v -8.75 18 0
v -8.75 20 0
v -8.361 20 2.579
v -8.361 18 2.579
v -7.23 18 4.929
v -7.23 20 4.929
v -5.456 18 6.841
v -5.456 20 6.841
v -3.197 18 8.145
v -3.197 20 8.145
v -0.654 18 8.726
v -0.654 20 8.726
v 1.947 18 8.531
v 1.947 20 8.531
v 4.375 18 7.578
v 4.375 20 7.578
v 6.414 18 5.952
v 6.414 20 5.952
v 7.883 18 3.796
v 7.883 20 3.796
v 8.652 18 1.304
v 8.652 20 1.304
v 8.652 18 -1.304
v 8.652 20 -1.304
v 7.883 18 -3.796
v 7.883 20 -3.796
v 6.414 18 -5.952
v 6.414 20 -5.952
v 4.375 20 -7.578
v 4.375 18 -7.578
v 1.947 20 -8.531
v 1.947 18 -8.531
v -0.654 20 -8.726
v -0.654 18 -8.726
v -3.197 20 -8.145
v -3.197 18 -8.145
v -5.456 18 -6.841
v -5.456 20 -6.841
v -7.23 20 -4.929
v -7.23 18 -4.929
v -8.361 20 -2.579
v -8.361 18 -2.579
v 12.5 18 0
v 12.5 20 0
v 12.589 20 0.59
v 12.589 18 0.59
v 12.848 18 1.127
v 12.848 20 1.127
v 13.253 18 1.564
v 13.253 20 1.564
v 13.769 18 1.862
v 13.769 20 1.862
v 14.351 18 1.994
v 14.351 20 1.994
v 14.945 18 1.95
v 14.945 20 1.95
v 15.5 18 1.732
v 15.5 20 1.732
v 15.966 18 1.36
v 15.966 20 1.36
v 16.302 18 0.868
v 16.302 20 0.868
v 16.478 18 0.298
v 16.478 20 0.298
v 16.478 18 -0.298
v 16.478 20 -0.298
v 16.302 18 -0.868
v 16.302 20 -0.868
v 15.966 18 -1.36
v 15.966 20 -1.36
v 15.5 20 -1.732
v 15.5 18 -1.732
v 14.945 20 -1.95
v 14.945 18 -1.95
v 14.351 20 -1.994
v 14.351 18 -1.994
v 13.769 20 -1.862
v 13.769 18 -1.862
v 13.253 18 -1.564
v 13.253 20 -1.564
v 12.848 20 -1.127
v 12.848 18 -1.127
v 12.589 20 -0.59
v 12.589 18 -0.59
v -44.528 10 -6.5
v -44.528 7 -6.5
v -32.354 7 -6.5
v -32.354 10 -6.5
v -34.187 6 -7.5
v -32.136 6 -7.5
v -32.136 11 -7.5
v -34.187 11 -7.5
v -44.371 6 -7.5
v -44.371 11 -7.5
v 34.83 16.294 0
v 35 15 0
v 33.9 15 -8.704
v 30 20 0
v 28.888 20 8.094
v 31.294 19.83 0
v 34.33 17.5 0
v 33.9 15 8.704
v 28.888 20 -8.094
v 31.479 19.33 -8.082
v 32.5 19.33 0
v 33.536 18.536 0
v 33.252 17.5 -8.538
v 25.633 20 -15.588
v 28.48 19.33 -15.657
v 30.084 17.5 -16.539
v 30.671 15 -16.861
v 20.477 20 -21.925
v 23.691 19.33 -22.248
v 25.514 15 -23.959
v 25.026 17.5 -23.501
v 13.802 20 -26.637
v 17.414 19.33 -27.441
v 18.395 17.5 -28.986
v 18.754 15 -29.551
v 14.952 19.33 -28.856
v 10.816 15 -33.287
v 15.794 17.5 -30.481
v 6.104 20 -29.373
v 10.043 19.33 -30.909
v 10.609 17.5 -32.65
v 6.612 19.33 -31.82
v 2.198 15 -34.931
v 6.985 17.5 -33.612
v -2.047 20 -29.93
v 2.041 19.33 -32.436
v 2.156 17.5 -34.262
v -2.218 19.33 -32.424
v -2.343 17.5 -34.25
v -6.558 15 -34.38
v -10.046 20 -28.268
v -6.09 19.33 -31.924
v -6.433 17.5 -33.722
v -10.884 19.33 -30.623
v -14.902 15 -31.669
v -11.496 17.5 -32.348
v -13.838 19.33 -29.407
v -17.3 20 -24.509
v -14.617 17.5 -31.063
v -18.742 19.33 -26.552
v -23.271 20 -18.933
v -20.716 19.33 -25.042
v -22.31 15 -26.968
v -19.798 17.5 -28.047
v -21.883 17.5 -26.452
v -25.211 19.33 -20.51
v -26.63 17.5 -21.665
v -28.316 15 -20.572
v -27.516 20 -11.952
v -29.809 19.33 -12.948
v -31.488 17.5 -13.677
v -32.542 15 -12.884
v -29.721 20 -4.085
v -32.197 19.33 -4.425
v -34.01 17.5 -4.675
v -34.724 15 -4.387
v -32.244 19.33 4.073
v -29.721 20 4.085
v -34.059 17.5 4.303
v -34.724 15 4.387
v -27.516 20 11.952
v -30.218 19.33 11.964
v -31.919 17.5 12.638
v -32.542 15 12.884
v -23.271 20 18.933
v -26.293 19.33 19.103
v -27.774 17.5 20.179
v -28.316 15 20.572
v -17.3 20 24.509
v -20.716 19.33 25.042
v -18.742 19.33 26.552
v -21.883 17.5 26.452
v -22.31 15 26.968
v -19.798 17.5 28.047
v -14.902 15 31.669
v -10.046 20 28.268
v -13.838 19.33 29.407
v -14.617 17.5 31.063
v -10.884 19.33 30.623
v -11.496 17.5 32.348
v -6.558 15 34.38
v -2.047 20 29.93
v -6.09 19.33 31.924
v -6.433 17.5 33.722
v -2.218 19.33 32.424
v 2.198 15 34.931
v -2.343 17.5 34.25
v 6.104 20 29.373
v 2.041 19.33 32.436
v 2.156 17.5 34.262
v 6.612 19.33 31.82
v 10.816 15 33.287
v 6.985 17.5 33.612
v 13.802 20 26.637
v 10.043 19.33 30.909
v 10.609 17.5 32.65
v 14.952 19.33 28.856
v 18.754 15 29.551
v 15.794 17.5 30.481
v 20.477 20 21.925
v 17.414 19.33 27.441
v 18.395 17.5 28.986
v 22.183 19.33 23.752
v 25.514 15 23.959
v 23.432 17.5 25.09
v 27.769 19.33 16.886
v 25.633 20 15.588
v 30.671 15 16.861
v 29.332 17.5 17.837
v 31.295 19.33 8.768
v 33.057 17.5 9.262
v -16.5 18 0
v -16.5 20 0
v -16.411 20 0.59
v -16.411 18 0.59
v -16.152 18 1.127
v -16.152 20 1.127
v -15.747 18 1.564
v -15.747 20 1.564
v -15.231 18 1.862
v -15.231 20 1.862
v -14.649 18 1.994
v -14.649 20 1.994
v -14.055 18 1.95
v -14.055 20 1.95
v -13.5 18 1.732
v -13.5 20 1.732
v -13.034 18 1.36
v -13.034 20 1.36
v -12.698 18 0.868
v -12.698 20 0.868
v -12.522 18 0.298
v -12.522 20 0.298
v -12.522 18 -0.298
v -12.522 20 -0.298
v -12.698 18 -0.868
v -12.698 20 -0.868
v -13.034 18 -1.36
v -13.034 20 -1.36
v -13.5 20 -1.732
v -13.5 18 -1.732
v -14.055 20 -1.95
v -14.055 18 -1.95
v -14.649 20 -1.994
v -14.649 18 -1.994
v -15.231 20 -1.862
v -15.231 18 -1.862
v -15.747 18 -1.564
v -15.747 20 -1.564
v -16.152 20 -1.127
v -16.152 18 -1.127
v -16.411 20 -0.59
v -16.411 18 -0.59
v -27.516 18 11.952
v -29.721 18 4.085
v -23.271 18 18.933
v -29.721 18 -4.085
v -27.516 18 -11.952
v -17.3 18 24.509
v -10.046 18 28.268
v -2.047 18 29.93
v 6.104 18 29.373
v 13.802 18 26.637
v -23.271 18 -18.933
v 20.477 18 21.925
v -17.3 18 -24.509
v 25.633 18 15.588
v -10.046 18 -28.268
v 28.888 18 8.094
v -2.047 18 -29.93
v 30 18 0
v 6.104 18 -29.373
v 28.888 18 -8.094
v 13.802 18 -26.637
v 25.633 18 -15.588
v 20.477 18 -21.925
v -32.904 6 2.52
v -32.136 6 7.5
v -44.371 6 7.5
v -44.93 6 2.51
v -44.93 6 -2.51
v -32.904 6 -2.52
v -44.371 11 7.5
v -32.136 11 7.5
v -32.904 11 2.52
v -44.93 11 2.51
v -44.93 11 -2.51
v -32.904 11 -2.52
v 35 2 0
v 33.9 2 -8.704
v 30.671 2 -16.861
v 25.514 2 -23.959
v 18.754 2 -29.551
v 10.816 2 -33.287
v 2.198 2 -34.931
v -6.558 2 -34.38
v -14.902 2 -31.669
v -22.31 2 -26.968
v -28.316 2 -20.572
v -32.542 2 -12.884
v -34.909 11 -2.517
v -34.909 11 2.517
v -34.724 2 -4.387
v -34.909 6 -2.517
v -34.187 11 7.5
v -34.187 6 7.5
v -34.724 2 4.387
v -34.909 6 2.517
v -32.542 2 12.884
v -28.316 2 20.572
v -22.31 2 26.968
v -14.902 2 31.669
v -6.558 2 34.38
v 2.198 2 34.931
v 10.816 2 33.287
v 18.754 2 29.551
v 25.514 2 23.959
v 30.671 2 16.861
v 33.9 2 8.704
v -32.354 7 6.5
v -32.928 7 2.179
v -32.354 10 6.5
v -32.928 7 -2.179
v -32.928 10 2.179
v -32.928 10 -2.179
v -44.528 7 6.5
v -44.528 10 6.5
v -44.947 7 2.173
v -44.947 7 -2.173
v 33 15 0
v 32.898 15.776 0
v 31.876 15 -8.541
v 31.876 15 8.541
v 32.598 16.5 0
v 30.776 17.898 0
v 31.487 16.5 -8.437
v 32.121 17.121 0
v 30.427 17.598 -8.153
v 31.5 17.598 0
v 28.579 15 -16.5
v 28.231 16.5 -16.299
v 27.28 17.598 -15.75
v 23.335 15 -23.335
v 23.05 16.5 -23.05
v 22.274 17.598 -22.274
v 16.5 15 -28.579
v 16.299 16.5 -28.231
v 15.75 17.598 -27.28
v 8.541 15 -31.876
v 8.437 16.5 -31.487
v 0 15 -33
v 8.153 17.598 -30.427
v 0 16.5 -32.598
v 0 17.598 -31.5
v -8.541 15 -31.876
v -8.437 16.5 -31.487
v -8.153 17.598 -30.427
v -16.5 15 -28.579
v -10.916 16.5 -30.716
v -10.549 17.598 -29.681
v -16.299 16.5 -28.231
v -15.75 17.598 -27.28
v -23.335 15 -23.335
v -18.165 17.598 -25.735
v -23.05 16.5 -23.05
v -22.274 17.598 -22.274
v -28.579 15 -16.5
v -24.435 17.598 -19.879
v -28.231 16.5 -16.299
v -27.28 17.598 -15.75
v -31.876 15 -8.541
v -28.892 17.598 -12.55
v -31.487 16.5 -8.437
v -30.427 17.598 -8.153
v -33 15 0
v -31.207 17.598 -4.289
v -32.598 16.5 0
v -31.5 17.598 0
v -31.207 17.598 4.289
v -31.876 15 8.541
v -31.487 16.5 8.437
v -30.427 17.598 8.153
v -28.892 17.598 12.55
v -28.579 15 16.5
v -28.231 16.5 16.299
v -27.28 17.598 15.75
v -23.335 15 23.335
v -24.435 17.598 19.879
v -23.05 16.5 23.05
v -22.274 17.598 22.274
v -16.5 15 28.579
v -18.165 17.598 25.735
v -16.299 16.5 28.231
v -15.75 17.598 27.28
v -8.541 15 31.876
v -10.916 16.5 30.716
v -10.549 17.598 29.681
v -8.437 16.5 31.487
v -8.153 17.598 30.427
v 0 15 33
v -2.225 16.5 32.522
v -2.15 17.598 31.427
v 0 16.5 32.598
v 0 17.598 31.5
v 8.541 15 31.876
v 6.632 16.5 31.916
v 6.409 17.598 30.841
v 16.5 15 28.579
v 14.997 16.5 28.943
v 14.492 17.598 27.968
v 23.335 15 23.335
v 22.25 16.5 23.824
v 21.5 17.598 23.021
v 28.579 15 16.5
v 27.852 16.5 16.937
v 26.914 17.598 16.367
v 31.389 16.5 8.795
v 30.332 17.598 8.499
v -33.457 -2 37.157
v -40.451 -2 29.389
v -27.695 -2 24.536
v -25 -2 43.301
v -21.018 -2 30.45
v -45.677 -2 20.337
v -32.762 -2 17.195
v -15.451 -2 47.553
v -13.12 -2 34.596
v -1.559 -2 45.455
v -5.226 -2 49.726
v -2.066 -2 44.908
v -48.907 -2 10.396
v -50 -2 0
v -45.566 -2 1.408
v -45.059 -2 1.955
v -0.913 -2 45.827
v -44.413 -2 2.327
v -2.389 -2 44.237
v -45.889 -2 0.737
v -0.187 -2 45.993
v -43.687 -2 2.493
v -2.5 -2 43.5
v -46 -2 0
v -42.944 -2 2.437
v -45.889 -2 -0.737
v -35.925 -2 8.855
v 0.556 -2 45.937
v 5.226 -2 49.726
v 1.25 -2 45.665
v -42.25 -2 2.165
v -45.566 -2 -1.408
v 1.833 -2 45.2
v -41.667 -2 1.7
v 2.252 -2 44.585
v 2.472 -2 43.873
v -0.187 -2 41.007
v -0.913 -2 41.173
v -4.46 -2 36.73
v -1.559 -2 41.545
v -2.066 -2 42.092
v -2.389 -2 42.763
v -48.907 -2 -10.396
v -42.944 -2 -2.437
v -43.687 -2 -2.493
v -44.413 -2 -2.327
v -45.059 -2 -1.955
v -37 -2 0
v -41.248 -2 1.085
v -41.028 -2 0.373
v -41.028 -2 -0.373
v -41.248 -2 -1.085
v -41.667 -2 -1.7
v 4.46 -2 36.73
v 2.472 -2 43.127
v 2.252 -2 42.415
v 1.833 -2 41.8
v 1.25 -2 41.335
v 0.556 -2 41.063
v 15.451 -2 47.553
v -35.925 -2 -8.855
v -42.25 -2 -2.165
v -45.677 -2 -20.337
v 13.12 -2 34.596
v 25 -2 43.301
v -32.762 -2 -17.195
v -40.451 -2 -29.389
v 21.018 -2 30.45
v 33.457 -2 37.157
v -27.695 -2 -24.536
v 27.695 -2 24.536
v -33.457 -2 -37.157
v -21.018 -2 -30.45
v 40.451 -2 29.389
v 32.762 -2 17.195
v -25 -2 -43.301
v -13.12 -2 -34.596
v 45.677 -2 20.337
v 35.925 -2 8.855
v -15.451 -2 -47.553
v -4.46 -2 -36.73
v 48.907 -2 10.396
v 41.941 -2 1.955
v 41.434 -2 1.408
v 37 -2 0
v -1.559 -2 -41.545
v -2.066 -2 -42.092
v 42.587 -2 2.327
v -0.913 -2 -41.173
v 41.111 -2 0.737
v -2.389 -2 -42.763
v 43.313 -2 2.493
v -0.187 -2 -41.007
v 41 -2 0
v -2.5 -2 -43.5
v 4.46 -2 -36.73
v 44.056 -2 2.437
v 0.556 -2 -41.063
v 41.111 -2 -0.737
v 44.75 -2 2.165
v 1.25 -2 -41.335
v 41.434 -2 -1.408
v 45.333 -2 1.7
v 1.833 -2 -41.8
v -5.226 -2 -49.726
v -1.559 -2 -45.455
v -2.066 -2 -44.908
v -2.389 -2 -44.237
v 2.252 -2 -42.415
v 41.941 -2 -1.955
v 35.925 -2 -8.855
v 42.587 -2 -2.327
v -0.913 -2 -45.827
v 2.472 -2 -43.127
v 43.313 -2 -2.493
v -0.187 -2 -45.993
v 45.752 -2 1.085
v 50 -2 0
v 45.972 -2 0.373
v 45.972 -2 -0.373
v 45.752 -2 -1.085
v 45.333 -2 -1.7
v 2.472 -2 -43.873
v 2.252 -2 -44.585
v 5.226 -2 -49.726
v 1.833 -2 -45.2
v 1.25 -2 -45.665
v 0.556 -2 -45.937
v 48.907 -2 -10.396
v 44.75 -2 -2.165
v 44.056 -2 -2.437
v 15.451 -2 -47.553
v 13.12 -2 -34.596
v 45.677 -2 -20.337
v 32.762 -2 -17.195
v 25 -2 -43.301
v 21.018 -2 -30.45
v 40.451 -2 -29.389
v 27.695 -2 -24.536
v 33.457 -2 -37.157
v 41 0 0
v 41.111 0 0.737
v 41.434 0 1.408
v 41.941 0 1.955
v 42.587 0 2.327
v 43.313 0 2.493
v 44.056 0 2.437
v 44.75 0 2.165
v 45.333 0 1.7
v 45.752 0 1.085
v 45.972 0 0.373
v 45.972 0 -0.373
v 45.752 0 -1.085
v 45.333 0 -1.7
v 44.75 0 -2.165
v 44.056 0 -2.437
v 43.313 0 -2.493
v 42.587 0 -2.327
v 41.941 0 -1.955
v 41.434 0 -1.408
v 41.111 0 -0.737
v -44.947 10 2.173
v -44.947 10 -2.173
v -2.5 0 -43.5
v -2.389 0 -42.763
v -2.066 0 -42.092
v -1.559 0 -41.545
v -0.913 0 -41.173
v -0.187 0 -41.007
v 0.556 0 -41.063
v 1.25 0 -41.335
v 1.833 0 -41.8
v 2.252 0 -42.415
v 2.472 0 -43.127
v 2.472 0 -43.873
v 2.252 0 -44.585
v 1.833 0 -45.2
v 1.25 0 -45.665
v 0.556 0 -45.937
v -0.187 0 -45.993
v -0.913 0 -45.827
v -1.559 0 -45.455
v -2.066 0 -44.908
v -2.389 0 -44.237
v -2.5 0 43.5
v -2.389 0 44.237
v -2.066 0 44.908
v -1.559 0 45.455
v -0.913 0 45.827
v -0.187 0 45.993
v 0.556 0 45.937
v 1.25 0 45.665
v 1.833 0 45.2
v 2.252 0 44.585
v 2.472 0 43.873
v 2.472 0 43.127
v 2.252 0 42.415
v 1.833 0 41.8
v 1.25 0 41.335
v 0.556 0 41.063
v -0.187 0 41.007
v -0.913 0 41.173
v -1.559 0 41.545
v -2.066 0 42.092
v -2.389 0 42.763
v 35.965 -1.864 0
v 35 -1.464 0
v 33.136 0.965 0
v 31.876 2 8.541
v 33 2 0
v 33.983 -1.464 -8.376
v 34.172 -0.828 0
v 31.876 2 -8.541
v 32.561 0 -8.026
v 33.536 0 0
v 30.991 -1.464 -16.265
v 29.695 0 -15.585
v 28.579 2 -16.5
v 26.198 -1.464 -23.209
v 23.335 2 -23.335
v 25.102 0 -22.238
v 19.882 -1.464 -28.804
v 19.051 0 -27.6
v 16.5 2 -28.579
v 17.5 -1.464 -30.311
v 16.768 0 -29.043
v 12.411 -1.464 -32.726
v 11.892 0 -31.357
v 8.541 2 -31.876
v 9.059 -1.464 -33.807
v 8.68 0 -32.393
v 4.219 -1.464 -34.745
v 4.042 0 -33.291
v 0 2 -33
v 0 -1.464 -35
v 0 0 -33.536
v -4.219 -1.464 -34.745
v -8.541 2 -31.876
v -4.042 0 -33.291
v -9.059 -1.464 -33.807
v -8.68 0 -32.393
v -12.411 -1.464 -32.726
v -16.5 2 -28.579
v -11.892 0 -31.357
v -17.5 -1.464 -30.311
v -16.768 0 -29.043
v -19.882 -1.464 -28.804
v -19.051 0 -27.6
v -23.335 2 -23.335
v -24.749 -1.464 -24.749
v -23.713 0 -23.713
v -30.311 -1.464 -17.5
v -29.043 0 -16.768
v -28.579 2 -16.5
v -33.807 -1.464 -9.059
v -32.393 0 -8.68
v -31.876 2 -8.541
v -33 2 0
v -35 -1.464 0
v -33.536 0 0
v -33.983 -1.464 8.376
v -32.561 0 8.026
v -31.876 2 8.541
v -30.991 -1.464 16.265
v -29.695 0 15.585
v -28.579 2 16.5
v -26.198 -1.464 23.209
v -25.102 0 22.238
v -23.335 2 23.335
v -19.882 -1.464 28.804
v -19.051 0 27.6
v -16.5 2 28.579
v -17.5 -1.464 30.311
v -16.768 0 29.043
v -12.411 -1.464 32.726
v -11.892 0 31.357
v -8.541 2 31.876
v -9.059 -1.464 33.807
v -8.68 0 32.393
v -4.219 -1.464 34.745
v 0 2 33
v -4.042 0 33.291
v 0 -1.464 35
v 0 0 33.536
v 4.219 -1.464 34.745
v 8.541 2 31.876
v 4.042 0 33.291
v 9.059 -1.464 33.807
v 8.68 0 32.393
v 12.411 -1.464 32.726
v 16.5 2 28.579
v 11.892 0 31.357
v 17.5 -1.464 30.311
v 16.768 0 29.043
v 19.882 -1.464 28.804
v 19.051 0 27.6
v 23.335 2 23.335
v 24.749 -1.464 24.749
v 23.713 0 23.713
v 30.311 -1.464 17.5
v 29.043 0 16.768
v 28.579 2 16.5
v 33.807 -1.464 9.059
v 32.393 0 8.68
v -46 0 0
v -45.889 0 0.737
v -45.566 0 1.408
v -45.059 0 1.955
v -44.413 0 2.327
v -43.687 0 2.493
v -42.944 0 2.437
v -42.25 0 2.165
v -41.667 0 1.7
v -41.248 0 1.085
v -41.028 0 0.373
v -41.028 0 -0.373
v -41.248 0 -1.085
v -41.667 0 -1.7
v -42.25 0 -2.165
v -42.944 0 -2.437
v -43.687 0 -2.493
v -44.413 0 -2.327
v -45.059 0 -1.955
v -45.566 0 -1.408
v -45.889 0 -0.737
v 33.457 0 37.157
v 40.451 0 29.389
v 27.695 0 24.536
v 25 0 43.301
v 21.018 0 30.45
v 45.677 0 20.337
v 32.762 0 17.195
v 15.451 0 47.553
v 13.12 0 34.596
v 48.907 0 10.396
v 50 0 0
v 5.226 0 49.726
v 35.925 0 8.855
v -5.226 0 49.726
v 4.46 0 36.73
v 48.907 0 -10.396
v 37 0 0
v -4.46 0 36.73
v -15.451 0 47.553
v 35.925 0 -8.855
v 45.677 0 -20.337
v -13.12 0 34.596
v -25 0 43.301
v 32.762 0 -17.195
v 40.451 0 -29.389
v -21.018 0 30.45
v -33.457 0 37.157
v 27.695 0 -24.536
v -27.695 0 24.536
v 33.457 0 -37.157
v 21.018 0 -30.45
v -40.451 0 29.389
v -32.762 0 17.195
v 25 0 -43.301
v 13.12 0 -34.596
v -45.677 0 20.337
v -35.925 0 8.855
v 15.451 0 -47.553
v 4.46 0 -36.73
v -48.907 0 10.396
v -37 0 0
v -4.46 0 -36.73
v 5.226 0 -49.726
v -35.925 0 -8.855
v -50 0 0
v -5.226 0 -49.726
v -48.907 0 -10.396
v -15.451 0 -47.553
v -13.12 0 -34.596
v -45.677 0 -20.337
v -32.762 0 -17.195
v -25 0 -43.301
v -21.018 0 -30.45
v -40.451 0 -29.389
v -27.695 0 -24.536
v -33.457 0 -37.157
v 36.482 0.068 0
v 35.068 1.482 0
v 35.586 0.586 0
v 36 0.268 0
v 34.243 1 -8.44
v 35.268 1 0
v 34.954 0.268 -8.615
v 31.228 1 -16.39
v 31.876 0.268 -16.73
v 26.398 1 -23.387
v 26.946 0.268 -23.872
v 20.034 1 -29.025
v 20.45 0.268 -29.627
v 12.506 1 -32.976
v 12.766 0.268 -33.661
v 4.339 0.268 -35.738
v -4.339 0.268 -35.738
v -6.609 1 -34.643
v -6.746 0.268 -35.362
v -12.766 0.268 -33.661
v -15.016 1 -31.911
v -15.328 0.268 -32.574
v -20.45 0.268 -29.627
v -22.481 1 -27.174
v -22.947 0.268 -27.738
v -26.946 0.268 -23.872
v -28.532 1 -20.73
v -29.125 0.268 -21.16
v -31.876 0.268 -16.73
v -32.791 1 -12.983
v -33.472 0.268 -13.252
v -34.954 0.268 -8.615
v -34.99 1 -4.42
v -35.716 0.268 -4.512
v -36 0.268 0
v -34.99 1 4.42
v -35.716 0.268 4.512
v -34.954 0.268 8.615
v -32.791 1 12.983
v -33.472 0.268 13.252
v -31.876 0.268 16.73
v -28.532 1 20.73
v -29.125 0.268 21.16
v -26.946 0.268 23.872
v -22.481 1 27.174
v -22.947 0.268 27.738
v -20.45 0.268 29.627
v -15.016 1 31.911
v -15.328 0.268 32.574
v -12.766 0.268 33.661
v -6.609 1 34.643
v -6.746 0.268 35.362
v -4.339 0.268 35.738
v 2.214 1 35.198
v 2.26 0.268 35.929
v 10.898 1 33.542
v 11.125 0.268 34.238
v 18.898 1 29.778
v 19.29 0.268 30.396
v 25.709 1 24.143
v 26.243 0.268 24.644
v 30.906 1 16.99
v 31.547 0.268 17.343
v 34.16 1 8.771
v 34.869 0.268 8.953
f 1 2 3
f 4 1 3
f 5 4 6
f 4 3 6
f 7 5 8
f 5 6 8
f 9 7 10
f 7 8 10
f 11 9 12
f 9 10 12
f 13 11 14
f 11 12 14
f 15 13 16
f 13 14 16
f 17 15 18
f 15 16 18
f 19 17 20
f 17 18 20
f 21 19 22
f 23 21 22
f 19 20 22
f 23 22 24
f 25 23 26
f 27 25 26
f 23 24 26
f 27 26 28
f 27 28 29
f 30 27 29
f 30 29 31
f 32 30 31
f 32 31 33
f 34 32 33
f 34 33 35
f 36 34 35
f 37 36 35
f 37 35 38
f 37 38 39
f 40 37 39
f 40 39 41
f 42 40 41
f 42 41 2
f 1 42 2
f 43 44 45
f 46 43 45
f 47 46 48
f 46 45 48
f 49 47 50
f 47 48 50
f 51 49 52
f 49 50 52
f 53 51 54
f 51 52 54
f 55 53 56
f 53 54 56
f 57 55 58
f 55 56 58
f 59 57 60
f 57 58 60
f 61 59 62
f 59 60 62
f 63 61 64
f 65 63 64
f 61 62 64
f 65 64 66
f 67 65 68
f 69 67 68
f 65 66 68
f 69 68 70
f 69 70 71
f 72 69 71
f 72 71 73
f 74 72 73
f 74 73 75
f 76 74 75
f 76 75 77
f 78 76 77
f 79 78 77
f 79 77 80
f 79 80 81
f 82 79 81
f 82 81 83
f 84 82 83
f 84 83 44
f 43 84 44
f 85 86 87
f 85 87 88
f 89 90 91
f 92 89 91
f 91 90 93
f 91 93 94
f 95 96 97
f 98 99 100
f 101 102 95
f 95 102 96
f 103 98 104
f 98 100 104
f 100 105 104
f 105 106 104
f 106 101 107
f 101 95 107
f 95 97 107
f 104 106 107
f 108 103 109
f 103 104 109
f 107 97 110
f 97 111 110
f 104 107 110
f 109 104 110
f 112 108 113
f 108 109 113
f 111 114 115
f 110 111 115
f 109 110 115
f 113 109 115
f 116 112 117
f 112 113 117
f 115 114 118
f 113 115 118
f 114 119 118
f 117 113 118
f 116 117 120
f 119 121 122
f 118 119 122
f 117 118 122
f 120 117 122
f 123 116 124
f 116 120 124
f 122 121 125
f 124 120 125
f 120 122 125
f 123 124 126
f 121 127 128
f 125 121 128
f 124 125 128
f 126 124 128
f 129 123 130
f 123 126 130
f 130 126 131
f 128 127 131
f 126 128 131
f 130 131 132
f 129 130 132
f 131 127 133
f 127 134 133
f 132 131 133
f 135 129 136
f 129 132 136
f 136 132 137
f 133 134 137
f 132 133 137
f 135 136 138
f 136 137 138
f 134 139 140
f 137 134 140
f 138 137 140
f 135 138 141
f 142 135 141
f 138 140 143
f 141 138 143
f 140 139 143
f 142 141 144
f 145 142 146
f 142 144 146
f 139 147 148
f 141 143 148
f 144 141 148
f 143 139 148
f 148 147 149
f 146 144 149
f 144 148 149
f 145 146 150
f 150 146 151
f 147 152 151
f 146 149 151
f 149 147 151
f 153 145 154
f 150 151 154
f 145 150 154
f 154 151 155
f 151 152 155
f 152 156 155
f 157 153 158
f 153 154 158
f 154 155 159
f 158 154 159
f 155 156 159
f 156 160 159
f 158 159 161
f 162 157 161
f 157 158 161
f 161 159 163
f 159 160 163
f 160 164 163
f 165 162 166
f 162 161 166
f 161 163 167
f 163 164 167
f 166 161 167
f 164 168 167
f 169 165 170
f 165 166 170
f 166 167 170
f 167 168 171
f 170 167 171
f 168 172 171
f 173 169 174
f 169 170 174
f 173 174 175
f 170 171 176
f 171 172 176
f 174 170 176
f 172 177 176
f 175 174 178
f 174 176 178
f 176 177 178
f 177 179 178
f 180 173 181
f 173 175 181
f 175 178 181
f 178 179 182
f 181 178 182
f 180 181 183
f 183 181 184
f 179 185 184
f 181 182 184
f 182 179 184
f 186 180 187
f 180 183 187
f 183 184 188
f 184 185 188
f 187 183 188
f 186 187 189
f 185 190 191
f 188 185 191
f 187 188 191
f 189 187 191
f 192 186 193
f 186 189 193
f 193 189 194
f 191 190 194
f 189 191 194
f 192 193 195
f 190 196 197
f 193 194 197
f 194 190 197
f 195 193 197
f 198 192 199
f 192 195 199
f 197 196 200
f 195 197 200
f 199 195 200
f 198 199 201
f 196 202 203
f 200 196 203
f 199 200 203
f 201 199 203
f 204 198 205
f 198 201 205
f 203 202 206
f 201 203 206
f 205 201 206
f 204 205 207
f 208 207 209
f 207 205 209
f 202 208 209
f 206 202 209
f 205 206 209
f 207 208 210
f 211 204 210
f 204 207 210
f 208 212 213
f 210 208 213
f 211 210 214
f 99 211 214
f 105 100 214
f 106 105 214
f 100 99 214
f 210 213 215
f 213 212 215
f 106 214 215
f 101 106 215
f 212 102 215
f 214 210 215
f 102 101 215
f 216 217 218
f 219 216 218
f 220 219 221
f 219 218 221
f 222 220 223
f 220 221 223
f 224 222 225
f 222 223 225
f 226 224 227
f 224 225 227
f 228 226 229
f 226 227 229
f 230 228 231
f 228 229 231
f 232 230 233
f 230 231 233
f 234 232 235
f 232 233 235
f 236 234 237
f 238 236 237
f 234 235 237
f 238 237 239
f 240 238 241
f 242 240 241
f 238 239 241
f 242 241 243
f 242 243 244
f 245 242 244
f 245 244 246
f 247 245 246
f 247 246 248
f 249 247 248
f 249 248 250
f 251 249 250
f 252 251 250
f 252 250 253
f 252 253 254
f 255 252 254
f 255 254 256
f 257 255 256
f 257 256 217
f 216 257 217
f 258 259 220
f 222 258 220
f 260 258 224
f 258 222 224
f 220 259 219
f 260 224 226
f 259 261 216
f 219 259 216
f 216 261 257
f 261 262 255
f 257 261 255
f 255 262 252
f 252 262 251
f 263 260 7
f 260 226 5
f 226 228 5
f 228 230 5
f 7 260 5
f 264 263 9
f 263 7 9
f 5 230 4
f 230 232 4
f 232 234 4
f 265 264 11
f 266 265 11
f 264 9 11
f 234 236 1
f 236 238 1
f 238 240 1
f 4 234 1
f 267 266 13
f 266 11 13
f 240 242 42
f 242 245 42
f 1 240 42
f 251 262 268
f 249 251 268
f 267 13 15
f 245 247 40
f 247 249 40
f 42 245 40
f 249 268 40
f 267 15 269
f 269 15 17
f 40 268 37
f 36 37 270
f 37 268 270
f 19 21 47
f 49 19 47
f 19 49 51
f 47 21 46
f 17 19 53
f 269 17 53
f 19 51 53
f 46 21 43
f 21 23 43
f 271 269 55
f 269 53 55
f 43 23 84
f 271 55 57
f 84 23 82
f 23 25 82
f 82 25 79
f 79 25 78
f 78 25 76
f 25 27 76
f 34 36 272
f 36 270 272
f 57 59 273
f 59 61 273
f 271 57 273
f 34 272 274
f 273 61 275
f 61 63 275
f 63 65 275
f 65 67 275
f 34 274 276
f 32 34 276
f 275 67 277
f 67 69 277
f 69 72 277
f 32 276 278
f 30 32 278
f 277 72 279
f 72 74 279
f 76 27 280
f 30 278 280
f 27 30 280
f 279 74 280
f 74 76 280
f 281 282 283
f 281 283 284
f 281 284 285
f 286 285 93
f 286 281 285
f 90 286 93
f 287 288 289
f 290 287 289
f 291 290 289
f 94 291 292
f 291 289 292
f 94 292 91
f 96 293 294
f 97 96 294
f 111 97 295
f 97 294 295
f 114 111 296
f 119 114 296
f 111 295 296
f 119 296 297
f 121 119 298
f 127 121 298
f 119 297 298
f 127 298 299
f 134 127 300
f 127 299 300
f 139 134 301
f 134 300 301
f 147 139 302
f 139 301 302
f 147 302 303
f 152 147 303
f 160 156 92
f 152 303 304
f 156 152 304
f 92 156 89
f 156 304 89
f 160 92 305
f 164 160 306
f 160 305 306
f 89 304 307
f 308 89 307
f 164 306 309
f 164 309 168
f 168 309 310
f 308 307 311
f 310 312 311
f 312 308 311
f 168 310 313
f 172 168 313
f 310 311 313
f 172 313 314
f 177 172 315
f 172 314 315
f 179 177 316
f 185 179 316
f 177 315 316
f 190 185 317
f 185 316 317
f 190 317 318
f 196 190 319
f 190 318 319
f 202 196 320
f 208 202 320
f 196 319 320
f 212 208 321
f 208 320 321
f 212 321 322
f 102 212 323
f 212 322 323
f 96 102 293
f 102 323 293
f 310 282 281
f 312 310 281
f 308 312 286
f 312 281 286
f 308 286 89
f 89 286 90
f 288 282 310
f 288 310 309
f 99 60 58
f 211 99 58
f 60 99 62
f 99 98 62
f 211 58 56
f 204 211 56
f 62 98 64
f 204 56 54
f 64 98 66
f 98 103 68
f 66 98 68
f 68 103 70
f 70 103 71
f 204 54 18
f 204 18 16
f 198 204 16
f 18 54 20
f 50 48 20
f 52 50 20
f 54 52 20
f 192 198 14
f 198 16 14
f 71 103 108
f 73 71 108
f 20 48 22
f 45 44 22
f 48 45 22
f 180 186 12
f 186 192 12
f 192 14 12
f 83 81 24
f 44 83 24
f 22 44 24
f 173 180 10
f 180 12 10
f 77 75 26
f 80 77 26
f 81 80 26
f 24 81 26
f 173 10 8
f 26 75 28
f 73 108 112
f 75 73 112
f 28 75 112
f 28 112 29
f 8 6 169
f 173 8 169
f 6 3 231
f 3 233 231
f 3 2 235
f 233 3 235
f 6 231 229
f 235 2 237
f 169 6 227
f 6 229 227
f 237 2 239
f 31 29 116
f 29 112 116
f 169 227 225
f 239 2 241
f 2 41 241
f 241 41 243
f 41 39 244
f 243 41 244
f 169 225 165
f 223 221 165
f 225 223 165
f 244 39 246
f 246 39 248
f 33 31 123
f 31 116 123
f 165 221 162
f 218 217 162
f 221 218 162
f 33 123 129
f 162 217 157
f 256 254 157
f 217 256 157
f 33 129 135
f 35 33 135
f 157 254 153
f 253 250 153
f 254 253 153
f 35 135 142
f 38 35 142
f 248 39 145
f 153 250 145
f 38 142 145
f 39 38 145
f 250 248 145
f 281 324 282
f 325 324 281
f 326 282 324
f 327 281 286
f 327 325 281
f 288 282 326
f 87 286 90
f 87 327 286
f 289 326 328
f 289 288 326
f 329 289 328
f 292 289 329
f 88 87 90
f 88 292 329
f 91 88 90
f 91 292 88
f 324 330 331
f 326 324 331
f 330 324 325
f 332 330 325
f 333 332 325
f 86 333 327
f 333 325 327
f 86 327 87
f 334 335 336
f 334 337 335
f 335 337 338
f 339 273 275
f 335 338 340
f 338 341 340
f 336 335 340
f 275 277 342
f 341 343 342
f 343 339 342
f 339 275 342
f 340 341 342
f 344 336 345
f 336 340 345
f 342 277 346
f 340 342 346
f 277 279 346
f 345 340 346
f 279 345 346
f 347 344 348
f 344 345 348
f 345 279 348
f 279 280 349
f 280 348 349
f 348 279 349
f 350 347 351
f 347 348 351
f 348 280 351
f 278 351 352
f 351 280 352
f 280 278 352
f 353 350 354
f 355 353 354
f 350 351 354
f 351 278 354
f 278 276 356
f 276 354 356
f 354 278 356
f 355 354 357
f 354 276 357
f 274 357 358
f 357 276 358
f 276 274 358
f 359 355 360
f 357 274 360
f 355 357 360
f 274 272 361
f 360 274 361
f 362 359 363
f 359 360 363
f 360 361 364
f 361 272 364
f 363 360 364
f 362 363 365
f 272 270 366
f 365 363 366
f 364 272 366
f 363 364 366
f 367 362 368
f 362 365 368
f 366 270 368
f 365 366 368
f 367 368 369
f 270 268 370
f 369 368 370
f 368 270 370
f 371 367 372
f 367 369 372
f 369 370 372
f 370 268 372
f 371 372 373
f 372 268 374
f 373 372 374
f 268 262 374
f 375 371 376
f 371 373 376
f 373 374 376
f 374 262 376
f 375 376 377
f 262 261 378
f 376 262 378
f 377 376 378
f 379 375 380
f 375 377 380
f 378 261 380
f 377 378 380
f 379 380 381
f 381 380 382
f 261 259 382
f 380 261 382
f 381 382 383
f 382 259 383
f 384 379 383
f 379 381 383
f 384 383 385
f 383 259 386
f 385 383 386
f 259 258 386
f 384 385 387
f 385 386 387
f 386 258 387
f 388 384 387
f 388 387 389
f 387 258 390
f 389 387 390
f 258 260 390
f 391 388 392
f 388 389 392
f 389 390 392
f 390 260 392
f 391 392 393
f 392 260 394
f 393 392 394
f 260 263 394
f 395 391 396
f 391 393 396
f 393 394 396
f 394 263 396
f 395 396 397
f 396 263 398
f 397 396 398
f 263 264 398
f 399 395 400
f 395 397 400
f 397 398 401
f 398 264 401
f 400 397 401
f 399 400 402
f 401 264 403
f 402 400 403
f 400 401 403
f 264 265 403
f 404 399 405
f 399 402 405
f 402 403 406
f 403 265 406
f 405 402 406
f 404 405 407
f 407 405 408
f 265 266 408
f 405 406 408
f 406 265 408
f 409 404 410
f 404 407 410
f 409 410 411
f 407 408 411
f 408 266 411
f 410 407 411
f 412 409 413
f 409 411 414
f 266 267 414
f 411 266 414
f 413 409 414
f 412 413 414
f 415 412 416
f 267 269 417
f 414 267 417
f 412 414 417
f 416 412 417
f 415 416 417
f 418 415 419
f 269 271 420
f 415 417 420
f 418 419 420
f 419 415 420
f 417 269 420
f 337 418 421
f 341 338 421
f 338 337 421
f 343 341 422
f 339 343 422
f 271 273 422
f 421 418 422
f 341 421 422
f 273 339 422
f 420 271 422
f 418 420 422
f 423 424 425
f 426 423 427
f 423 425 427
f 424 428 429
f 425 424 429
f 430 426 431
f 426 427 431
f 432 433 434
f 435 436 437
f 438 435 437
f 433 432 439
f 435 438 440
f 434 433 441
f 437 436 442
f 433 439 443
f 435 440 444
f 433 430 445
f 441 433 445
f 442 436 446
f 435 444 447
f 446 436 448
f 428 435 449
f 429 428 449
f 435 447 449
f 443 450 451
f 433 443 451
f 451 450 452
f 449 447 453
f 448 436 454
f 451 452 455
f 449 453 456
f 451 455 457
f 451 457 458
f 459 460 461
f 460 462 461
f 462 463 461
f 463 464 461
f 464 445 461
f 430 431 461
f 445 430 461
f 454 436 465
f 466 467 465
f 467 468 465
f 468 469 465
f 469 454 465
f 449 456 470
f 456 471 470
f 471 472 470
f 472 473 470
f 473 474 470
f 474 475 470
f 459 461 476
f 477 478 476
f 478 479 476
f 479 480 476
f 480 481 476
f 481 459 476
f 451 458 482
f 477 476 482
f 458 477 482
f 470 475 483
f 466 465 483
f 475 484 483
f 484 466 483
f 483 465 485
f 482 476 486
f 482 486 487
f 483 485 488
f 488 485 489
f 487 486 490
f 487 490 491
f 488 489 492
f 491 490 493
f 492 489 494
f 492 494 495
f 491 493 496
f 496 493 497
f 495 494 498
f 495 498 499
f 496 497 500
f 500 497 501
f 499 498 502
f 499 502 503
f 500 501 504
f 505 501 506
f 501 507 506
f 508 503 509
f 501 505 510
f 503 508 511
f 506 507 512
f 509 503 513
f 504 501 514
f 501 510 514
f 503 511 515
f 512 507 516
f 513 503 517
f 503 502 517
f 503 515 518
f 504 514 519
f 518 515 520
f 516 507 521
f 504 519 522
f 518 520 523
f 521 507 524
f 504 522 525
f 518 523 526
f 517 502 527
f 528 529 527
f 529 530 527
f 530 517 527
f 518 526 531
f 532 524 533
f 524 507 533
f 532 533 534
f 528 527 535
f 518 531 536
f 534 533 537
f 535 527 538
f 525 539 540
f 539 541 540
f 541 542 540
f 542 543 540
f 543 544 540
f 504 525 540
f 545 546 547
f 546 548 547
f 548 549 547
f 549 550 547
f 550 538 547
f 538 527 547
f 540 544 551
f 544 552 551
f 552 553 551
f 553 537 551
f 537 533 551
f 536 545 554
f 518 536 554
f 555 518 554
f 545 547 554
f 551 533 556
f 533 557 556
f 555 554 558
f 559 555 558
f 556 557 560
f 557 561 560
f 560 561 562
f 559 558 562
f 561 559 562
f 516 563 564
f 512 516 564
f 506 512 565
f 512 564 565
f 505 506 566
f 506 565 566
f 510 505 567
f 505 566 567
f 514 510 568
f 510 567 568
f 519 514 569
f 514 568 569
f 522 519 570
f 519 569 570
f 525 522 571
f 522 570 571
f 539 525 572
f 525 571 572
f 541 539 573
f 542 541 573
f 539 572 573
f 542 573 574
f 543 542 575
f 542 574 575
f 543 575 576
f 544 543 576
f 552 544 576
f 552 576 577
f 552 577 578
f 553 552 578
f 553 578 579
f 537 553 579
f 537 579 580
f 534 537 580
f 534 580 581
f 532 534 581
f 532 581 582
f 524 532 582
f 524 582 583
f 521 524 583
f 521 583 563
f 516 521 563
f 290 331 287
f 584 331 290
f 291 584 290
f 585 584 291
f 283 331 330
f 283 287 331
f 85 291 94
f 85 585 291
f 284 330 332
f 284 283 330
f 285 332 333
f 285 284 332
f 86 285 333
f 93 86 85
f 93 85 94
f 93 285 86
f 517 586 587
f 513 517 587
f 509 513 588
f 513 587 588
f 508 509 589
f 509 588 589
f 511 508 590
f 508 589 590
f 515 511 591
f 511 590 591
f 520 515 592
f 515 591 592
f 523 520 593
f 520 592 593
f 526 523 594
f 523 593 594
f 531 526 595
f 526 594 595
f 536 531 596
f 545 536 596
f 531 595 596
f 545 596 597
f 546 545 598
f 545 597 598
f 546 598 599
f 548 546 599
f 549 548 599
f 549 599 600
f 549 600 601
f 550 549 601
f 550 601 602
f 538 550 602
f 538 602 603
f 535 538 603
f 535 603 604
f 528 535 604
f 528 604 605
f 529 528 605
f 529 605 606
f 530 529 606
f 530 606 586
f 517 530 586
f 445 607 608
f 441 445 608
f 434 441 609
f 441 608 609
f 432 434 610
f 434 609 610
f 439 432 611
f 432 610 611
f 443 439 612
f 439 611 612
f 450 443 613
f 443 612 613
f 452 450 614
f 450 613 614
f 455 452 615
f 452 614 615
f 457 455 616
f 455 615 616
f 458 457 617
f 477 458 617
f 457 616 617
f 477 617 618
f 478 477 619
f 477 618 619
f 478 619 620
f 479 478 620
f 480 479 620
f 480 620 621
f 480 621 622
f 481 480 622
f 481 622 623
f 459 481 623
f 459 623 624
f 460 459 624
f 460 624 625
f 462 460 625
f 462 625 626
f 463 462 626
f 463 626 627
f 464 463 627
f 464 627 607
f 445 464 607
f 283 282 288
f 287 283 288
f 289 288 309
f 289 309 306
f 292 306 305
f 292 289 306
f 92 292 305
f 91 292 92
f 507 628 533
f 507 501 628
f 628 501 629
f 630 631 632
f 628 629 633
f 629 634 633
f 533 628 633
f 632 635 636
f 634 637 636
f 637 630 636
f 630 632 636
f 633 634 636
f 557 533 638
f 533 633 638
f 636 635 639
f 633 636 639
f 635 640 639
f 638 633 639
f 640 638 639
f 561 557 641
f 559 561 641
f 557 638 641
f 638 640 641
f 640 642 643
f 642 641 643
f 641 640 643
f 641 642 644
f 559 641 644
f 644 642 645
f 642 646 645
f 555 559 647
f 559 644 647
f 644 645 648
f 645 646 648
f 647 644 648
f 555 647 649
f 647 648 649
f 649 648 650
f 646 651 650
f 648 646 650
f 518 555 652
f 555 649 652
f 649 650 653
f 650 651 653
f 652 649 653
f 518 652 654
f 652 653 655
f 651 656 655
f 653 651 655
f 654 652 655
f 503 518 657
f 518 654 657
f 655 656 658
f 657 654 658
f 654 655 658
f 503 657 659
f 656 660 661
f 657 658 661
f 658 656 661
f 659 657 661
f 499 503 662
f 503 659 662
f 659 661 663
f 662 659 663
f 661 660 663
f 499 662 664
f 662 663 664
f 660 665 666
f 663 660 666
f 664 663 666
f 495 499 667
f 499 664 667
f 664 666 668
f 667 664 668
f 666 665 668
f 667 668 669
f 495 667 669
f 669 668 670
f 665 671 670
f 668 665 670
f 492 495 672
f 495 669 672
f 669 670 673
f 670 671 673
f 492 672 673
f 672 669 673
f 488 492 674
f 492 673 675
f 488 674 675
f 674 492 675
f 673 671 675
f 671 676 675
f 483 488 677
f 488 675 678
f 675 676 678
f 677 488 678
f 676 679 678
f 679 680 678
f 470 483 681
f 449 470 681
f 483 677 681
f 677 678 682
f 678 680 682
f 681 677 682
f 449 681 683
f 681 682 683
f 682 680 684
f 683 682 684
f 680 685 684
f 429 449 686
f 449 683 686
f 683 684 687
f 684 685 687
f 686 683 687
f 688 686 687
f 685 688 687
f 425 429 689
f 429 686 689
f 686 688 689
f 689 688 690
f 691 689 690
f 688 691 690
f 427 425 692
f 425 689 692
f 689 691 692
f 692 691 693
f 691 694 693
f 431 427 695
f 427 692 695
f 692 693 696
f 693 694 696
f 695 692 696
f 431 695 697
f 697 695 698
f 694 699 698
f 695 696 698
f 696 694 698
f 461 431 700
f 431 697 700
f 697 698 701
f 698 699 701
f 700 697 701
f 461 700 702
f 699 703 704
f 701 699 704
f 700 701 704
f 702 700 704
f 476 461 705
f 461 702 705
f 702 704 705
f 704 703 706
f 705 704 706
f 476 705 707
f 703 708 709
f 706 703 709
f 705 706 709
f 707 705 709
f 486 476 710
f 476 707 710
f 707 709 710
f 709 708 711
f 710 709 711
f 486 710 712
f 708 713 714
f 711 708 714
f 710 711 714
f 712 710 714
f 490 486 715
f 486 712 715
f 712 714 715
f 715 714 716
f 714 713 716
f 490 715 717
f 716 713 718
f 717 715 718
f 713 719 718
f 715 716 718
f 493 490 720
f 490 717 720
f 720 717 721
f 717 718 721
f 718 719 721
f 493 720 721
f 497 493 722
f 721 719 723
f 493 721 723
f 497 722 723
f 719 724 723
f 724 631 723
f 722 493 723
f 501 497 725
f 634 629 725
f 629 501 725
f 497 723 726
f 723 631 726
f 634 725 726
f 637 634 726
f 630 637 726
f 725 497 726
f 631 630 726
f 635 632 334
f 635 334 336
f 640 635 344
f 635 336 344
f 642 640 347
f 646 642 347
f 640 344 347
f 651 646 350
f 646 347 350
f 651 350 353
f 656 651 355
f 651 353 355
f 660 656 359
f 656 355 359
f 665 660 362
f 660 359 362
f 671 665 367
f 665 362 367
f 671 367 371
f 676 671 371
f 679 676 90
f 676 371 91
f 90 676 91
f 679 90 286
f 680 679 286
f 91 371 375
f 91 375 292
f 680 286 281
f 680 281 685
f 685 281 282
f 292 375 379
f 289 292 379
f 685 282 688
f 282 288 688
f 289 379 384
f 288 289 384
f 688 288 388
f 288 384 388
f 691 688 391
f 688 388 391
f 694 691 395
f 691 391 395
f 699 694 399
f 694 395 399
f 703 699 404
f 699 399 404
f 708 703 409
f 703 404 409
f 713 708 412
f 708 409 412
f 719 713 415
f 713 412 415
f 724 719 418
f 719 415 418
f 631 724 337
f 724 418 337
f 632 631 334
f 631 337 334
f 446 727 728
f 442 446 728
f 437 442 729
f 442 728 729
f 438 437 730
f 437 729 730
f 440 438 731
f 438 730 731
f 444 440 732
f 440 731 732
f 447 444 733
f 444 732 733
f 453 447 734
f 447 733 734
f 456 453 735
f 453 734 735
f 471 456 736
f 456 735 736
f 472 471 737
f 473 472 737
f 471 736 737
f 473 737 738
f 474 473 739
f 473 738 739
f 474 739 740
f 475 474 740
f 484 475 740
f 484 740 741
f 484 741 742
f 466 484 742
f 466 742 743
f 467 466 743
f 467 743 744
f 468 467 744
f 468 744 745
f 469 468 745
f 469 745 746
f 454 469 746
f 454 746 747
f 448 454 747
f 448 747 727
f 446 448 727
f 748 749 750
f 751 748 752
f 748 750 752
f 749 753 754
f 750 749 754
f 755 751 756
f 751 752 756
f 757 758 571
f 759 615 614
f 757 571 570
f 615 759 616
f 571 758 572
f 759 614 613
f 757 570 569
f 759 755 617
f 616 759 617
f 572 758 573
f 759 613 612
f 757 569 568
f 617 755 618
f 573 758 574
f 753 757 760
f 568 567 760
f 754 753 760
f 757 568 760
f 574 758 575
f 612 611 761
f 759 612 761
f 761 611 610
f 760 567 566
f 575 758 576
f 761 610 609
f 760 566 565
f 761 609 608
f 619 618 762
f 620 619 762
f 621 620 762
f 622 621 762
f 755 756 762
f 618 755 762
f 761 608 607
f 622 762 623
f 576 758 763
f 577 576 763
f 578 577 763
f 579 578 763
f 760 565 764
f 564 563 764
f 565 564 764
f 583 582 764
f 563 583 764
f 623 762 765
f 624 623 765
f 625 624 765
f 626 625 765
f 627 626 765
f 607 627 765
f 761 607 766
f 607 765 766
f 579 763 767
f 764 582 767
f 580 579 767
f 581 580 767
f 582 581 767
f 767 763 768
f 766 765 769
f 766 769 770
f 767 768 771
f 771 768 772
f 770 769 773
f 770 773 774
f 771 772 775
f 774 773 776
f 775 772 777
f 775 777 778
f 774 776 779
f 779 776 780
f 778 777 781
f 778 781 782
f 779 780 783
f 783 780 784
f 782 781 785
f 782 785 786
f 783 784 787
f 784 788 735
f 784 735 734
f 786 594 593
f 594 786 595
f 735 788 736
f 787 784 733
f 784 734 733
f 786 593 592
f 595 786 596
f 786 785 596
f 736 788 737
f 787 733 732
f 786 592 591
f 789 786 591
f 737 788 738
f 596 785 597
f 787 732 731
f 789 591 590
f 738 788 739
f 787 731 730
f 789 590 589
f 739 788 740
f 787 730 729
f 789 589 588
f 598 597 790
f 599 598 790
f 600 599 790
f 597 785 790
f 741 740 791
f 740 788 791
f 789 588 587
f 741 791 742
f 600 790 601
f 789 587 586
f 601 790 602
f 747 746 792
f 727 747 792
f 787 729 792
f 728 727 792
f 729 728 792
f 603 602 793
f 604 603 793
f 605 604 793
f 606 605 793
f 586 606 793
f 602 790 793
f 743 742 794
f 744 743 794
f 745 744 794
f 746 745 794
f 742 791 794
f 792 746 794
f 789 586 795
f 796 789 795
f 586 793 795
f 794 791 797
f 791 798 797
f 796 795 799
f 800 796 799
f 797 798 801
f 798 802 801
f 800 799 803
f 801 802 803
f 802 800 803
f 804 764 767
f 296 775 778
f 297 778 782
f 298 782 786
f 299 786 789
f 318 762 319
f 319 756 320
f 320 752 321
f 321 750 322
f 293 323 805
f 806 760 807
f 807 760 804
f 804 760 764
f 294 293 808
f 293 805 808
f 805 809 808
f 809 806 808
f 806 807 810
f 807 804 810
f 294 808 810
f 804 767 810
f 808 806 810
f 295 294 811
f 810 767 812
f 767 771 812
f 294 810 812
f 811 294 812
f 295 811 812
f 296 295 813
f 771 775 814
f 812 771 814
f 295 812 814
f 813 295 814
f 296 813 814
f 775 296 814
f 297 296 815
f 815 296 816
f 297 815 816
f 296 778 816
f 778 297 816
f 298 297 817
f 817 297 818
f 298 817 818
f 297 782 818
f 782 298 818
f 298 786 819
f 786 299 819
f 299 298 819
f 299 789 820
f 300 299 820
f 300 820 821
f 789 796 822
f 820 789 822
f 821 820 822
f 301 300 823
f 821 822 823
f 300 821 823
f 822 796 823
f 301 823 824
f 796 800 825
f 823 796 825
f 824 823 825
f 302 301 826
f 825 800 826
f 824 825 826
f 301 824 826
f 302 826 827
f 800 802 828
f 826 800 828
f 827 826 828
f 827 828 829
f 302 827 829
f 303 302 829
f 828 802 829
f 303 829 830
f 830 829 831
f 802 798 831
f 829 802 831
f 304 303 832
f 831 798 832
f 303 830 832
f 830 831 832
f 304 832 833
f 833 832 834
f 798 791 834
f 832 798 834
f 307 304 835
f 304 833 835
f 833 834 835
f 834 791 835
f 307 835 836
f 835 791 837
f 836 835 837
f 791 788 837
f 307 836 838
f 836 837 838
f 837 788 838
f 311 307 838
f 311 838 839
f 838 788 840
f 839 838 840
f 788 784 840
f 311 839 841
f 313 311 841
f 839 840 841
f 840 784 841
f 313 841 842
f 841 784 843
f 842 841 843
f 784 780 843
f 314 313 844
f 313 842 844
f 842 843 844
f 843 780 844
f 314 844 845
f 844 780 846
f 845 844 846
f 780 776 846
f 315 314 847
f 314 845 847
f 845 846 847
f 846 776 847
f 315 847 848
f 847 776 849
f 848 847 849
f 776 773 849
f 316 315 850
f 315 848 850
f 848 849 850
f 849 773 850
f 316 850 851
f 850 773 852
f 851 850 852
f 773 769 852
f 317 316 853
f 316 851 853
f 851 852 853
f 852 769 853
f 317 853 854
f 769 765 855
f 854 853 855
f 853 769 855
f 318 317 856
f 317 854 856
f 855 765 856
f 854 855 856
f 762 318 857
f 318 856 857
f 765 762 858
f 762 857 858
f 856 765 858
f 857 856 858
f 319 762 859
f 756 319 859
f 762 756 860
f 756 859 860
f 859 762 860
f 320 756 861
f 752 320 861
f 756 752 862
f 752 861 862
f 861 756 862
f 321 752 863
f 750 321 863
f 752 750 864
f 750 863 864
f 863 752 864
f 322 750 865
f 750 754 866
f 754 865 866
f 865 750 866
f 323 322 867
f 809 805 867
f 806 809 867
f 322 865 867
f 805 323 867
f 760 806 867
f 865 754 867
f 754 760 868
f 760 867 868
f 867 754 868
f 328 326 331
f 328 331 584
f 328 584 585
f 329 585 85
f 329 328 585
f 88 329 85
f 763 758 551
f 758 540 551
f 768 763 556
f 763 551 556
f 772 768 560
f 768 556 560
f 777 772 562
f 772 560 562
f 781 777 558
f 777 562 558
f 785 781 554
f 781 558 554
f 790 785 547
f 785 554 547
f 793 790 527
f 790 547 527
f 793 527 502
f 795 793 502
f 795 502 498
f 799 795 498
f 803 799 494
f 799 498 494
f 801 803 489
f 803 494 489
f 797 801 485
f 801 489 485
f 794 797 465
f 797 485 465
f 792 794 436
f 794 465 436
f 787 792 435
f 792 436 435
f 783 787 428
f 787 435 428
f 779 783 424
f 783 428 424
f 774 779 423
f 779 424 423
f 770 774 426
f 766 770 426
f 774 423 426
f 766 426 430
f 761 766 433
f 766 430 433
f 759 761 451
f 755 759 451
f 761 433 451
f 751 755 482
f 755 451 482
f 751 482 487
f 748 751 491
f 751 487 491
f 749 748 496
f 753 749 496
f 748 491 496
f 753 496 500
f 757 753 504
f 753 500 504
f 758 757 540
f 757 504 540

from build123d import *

# Parameters (mm, degrees)
CUT_EXTRUDE1_REACH       = 76.054
SKETCH2_R                = 2
SKETCH2_R_2              = 8.75
CUT_EXTRUDE2_REACH       = 75.485
CUT_EXTRUDE2_END_RADIUS  = 35
SKETCH3_W                = 15
SKETCH3_H                = 5
EXTRUDE_THIN1_REACH      = 75.485
EXTRUDE_THIN1_END_RADIUS = 45
SKETCH3_2_W              = 15
SKETCH3_2_H              = 5
SKETCH3_2_W_2            = 13
SKETCH3_2_H_2            = 3
CUT_EXTRUDE3_START       = -5
CUT_EXTRUDE3_DEPTH       = 5
SKETCH5_R                = 2.5
CUT_EXTRUDE4_DEPTH       = 74.484692283


with BuildPart() as part:
    # Sketch1 → Revolve-Thin1 (revolve)
    with BuildSketch(Plane.XY):
        with BuildLine():
            Line((0, 20), (30, 20))
            ThreePointArc((30, 20), (33.535533906, 18.535533906), (35, 15))
            Line((35, 15), (35, 2))
            ThreePointArc((35, 2), (35.585786438, 0.585786438), (37, 0))
            Line((37, 0), (50, 0))
            Line((50, 0), (50, -2))
            Line((50, -2), (37, -2))
            ThreePointArc((37, -2), (34.171572875, -0.828427125), (33, 2))
            Line((33, 2), (33, 15))
            ThreePointArc((33, 15), (32.121320344, 17.121320344), (30, 18))
            Line((30, 18), (0, 18))
            Line((0, 18), (0, 20))
        make_face()
    revolve(axis=Axis((0, -881.36101513, 0), (0, 1, 0)))

    # Sketch2 → Cut-Extrude1 (cut, up to next)
    with BuildSketch(Plane(origin=(0, 20, 0), x_dir=(1, 0, 0), z_dir=(0, 1, 0)), mode=Mode.PRIVATE) as cut_extrude1_sk1:
        with Locations(Location((14.5, 0, 0), (0, 0, 180))):
            Circle(SKETCH2_R)
    cut_extrude1_tool1 = extrude(cut_extrude1_sk1.sketch, amount=-CUT_EXTRUDE1_REACH, mode=Mode.PRIVATE) & part.part
    # Sketch2 → Cut-Extrude1 (cut, up to next)
    with BuildSketch(Plane(origin=(0, 20, 0), x_dir=(1, 0, 0), z_dir=(0, 1, 0)), mode=Mode.PRIVATE) as cut_extrude1_sk2:
        with Locations(Location((-14.5, 0, 0), (0, 0, 180))):
            Circle(SKETCH2_R)
    cut_extrude1_tool2 = extrude(cut_extrude1_sk2.sketch, amount=-CUT_EXTRUDE1_REACH, mode=Mode.PRIVATE) & part.part
    # Sketch2 → Cut-Extrude1 (cut, up to next)
    with BuildSketch(Plane(origin=(0, 20, 0), x_dir=(1, 0, 0), z_dir=(0, 1, 0)), mode=Mode.PRIVATE) as cut_extrude1_sk3:
        with Locations(Location((0, 0, 0), (0, 0, 180))):
            Circle(SKETCH2_R_2)
    cut_extrude1_tool3 = extrude(cut_extrude1_sk3.sketch, amount=-CUT_EXTRUDE1_REACH, mode=Mode.PRIVATE) & part.part
    add(cut_extrude1_tool1.solids().sort_by_distance((14.5, 20, 0))[0], mode=Mode.SUBTRACT)
    add(cut_extrude1_tool2.solids().sort_by_distance((-14.5, 20, 0))[0], mode=Mode.SUBTRACT)
    add(cut_extrude1_tool3.solids().sort_by_distance((0, 20, 0))[0], mode=Mode.SUBTRACT)

    # Cut-Extrude2: up to this cylinder (the profile starts inside it)
    cut_extrude2_end = Plane(origin=(0, 8.5, 0), z_dir=(0, -1, 0)) * Cylinder(CUT_EXTRUDE2_END_RADIUS, 221.97, mode=Mode.PRIVATE)
    # Sketch3 → Cut-Extrude2 (cut, up to the surface)
    with BuildSketch(Plane(origin=(0, 0, 0), x_dir=(0, 0, -1), z_dir=(1, 0, 0)), mode=Mode.PRIVATE) as cut_extrude2_sk1:
        with Locations((0, 8.5)):
            Rectangle(SKETCH3_W, SKETCH3_H)
    cut_extrude2_tool1 = extrude(cut_extrude2_sk1.sketch, amount=-CUT_EXTRUDE2_REACH, mode=Mode.PRIVATE) & cut_extrude2_end
    add(cut_extrude2_tool1.solids().sort_by_distance((0, 8.5, 0))[0], mode=Mode.SUBTRACT)

    # Sketch5 → Cut-Extrude4 (cut, through all)
    with BuildSketch(Plane(origin=(0, 0, 0), x_dir=(1, 0, 0), z_dir=(0, 1, 0))):
        with Locations(Location((0, 43.5, 0), (0, 0, 180))):
            Circle(SKETCH5_R)
        with Locations(Location((43.5, 0, 0), (0, 0, 180))):
            Circle(SKETCH5_R)
        with Locations(Location((0, -43.5, 0), (0, 0, 180))):
            Circle(SKETCH5_R)
        with Locations(Location((-43.5, 0, 0), (0, 0, 180))):
            Circle(SKETCH5_R)
    extrude(amount=-CUT_EXTRUDE4_DEPTH, mode=Mode.SUBTRACT)


with BuildPart() as body_2:
    # Extrude-Thin1: up to this cylinder (the profile starts inside it)
    extrude_thin1_end = Plane(origin=(0, 6.158114, 0), z_dir=(0, -1, 0)) * Cylinder(EXTRUDE_THIN1_END_RADIUS, 241.97, mode=Mode.PRIVATE)
    # Sketch3<2> → Extrude-Thin1 (new, up to the surface)
    with BuildSketch(Plane(origin=(0, 0, 0), x_dir=(0, 0, -1), z_dir=(1, 0, 0)), mode=Mode.PRIVATE) as extrude_thin1_sk1:
        with Locations((0, 8.5)):
            Rectangle(SKETCH3_2_W, SKETCH3_2_H)
        with Locations((0, 8.5)):
            Rectangle(SKETCH3_2_W_2, SKETCH3_2_H_2, mode=Mode.SUBTRACT)
    extrude_thin1_tool1 = extrude(extrude_thin1_sk1.sketch, amount=-EXTRUDE_THIN1_REACH, mode=Mode.PRIVATE) & extrude_thin1_end
    add(extrude_thin1_tool1.solids().sort_by_distance((0, 6.158114, 0))[0])

    # Sketch4 → Cut-Extrude3 (cut)
    with BuildSketch(Plane.XZ.offset(-6).offset(CUT_EXTRUDE3_START)):
        with BuildLine():
            Line((-32.136427928, -7.5), (0, -7.5))
            Line((0, -7.5), (0, 7.5))
            Line((0, 7.5), (-32.136427928, 7.5))
            ThreePointArc((-32.136427928, 7.5), (-33, 0), (-32.136427928, -7.5))
        make_face()
    extrude(amount=CUT_EXTRUDE3_DEPTH, mode=Mode.SUBTRACT)


solid = Compound([part.part, body_2.part])
